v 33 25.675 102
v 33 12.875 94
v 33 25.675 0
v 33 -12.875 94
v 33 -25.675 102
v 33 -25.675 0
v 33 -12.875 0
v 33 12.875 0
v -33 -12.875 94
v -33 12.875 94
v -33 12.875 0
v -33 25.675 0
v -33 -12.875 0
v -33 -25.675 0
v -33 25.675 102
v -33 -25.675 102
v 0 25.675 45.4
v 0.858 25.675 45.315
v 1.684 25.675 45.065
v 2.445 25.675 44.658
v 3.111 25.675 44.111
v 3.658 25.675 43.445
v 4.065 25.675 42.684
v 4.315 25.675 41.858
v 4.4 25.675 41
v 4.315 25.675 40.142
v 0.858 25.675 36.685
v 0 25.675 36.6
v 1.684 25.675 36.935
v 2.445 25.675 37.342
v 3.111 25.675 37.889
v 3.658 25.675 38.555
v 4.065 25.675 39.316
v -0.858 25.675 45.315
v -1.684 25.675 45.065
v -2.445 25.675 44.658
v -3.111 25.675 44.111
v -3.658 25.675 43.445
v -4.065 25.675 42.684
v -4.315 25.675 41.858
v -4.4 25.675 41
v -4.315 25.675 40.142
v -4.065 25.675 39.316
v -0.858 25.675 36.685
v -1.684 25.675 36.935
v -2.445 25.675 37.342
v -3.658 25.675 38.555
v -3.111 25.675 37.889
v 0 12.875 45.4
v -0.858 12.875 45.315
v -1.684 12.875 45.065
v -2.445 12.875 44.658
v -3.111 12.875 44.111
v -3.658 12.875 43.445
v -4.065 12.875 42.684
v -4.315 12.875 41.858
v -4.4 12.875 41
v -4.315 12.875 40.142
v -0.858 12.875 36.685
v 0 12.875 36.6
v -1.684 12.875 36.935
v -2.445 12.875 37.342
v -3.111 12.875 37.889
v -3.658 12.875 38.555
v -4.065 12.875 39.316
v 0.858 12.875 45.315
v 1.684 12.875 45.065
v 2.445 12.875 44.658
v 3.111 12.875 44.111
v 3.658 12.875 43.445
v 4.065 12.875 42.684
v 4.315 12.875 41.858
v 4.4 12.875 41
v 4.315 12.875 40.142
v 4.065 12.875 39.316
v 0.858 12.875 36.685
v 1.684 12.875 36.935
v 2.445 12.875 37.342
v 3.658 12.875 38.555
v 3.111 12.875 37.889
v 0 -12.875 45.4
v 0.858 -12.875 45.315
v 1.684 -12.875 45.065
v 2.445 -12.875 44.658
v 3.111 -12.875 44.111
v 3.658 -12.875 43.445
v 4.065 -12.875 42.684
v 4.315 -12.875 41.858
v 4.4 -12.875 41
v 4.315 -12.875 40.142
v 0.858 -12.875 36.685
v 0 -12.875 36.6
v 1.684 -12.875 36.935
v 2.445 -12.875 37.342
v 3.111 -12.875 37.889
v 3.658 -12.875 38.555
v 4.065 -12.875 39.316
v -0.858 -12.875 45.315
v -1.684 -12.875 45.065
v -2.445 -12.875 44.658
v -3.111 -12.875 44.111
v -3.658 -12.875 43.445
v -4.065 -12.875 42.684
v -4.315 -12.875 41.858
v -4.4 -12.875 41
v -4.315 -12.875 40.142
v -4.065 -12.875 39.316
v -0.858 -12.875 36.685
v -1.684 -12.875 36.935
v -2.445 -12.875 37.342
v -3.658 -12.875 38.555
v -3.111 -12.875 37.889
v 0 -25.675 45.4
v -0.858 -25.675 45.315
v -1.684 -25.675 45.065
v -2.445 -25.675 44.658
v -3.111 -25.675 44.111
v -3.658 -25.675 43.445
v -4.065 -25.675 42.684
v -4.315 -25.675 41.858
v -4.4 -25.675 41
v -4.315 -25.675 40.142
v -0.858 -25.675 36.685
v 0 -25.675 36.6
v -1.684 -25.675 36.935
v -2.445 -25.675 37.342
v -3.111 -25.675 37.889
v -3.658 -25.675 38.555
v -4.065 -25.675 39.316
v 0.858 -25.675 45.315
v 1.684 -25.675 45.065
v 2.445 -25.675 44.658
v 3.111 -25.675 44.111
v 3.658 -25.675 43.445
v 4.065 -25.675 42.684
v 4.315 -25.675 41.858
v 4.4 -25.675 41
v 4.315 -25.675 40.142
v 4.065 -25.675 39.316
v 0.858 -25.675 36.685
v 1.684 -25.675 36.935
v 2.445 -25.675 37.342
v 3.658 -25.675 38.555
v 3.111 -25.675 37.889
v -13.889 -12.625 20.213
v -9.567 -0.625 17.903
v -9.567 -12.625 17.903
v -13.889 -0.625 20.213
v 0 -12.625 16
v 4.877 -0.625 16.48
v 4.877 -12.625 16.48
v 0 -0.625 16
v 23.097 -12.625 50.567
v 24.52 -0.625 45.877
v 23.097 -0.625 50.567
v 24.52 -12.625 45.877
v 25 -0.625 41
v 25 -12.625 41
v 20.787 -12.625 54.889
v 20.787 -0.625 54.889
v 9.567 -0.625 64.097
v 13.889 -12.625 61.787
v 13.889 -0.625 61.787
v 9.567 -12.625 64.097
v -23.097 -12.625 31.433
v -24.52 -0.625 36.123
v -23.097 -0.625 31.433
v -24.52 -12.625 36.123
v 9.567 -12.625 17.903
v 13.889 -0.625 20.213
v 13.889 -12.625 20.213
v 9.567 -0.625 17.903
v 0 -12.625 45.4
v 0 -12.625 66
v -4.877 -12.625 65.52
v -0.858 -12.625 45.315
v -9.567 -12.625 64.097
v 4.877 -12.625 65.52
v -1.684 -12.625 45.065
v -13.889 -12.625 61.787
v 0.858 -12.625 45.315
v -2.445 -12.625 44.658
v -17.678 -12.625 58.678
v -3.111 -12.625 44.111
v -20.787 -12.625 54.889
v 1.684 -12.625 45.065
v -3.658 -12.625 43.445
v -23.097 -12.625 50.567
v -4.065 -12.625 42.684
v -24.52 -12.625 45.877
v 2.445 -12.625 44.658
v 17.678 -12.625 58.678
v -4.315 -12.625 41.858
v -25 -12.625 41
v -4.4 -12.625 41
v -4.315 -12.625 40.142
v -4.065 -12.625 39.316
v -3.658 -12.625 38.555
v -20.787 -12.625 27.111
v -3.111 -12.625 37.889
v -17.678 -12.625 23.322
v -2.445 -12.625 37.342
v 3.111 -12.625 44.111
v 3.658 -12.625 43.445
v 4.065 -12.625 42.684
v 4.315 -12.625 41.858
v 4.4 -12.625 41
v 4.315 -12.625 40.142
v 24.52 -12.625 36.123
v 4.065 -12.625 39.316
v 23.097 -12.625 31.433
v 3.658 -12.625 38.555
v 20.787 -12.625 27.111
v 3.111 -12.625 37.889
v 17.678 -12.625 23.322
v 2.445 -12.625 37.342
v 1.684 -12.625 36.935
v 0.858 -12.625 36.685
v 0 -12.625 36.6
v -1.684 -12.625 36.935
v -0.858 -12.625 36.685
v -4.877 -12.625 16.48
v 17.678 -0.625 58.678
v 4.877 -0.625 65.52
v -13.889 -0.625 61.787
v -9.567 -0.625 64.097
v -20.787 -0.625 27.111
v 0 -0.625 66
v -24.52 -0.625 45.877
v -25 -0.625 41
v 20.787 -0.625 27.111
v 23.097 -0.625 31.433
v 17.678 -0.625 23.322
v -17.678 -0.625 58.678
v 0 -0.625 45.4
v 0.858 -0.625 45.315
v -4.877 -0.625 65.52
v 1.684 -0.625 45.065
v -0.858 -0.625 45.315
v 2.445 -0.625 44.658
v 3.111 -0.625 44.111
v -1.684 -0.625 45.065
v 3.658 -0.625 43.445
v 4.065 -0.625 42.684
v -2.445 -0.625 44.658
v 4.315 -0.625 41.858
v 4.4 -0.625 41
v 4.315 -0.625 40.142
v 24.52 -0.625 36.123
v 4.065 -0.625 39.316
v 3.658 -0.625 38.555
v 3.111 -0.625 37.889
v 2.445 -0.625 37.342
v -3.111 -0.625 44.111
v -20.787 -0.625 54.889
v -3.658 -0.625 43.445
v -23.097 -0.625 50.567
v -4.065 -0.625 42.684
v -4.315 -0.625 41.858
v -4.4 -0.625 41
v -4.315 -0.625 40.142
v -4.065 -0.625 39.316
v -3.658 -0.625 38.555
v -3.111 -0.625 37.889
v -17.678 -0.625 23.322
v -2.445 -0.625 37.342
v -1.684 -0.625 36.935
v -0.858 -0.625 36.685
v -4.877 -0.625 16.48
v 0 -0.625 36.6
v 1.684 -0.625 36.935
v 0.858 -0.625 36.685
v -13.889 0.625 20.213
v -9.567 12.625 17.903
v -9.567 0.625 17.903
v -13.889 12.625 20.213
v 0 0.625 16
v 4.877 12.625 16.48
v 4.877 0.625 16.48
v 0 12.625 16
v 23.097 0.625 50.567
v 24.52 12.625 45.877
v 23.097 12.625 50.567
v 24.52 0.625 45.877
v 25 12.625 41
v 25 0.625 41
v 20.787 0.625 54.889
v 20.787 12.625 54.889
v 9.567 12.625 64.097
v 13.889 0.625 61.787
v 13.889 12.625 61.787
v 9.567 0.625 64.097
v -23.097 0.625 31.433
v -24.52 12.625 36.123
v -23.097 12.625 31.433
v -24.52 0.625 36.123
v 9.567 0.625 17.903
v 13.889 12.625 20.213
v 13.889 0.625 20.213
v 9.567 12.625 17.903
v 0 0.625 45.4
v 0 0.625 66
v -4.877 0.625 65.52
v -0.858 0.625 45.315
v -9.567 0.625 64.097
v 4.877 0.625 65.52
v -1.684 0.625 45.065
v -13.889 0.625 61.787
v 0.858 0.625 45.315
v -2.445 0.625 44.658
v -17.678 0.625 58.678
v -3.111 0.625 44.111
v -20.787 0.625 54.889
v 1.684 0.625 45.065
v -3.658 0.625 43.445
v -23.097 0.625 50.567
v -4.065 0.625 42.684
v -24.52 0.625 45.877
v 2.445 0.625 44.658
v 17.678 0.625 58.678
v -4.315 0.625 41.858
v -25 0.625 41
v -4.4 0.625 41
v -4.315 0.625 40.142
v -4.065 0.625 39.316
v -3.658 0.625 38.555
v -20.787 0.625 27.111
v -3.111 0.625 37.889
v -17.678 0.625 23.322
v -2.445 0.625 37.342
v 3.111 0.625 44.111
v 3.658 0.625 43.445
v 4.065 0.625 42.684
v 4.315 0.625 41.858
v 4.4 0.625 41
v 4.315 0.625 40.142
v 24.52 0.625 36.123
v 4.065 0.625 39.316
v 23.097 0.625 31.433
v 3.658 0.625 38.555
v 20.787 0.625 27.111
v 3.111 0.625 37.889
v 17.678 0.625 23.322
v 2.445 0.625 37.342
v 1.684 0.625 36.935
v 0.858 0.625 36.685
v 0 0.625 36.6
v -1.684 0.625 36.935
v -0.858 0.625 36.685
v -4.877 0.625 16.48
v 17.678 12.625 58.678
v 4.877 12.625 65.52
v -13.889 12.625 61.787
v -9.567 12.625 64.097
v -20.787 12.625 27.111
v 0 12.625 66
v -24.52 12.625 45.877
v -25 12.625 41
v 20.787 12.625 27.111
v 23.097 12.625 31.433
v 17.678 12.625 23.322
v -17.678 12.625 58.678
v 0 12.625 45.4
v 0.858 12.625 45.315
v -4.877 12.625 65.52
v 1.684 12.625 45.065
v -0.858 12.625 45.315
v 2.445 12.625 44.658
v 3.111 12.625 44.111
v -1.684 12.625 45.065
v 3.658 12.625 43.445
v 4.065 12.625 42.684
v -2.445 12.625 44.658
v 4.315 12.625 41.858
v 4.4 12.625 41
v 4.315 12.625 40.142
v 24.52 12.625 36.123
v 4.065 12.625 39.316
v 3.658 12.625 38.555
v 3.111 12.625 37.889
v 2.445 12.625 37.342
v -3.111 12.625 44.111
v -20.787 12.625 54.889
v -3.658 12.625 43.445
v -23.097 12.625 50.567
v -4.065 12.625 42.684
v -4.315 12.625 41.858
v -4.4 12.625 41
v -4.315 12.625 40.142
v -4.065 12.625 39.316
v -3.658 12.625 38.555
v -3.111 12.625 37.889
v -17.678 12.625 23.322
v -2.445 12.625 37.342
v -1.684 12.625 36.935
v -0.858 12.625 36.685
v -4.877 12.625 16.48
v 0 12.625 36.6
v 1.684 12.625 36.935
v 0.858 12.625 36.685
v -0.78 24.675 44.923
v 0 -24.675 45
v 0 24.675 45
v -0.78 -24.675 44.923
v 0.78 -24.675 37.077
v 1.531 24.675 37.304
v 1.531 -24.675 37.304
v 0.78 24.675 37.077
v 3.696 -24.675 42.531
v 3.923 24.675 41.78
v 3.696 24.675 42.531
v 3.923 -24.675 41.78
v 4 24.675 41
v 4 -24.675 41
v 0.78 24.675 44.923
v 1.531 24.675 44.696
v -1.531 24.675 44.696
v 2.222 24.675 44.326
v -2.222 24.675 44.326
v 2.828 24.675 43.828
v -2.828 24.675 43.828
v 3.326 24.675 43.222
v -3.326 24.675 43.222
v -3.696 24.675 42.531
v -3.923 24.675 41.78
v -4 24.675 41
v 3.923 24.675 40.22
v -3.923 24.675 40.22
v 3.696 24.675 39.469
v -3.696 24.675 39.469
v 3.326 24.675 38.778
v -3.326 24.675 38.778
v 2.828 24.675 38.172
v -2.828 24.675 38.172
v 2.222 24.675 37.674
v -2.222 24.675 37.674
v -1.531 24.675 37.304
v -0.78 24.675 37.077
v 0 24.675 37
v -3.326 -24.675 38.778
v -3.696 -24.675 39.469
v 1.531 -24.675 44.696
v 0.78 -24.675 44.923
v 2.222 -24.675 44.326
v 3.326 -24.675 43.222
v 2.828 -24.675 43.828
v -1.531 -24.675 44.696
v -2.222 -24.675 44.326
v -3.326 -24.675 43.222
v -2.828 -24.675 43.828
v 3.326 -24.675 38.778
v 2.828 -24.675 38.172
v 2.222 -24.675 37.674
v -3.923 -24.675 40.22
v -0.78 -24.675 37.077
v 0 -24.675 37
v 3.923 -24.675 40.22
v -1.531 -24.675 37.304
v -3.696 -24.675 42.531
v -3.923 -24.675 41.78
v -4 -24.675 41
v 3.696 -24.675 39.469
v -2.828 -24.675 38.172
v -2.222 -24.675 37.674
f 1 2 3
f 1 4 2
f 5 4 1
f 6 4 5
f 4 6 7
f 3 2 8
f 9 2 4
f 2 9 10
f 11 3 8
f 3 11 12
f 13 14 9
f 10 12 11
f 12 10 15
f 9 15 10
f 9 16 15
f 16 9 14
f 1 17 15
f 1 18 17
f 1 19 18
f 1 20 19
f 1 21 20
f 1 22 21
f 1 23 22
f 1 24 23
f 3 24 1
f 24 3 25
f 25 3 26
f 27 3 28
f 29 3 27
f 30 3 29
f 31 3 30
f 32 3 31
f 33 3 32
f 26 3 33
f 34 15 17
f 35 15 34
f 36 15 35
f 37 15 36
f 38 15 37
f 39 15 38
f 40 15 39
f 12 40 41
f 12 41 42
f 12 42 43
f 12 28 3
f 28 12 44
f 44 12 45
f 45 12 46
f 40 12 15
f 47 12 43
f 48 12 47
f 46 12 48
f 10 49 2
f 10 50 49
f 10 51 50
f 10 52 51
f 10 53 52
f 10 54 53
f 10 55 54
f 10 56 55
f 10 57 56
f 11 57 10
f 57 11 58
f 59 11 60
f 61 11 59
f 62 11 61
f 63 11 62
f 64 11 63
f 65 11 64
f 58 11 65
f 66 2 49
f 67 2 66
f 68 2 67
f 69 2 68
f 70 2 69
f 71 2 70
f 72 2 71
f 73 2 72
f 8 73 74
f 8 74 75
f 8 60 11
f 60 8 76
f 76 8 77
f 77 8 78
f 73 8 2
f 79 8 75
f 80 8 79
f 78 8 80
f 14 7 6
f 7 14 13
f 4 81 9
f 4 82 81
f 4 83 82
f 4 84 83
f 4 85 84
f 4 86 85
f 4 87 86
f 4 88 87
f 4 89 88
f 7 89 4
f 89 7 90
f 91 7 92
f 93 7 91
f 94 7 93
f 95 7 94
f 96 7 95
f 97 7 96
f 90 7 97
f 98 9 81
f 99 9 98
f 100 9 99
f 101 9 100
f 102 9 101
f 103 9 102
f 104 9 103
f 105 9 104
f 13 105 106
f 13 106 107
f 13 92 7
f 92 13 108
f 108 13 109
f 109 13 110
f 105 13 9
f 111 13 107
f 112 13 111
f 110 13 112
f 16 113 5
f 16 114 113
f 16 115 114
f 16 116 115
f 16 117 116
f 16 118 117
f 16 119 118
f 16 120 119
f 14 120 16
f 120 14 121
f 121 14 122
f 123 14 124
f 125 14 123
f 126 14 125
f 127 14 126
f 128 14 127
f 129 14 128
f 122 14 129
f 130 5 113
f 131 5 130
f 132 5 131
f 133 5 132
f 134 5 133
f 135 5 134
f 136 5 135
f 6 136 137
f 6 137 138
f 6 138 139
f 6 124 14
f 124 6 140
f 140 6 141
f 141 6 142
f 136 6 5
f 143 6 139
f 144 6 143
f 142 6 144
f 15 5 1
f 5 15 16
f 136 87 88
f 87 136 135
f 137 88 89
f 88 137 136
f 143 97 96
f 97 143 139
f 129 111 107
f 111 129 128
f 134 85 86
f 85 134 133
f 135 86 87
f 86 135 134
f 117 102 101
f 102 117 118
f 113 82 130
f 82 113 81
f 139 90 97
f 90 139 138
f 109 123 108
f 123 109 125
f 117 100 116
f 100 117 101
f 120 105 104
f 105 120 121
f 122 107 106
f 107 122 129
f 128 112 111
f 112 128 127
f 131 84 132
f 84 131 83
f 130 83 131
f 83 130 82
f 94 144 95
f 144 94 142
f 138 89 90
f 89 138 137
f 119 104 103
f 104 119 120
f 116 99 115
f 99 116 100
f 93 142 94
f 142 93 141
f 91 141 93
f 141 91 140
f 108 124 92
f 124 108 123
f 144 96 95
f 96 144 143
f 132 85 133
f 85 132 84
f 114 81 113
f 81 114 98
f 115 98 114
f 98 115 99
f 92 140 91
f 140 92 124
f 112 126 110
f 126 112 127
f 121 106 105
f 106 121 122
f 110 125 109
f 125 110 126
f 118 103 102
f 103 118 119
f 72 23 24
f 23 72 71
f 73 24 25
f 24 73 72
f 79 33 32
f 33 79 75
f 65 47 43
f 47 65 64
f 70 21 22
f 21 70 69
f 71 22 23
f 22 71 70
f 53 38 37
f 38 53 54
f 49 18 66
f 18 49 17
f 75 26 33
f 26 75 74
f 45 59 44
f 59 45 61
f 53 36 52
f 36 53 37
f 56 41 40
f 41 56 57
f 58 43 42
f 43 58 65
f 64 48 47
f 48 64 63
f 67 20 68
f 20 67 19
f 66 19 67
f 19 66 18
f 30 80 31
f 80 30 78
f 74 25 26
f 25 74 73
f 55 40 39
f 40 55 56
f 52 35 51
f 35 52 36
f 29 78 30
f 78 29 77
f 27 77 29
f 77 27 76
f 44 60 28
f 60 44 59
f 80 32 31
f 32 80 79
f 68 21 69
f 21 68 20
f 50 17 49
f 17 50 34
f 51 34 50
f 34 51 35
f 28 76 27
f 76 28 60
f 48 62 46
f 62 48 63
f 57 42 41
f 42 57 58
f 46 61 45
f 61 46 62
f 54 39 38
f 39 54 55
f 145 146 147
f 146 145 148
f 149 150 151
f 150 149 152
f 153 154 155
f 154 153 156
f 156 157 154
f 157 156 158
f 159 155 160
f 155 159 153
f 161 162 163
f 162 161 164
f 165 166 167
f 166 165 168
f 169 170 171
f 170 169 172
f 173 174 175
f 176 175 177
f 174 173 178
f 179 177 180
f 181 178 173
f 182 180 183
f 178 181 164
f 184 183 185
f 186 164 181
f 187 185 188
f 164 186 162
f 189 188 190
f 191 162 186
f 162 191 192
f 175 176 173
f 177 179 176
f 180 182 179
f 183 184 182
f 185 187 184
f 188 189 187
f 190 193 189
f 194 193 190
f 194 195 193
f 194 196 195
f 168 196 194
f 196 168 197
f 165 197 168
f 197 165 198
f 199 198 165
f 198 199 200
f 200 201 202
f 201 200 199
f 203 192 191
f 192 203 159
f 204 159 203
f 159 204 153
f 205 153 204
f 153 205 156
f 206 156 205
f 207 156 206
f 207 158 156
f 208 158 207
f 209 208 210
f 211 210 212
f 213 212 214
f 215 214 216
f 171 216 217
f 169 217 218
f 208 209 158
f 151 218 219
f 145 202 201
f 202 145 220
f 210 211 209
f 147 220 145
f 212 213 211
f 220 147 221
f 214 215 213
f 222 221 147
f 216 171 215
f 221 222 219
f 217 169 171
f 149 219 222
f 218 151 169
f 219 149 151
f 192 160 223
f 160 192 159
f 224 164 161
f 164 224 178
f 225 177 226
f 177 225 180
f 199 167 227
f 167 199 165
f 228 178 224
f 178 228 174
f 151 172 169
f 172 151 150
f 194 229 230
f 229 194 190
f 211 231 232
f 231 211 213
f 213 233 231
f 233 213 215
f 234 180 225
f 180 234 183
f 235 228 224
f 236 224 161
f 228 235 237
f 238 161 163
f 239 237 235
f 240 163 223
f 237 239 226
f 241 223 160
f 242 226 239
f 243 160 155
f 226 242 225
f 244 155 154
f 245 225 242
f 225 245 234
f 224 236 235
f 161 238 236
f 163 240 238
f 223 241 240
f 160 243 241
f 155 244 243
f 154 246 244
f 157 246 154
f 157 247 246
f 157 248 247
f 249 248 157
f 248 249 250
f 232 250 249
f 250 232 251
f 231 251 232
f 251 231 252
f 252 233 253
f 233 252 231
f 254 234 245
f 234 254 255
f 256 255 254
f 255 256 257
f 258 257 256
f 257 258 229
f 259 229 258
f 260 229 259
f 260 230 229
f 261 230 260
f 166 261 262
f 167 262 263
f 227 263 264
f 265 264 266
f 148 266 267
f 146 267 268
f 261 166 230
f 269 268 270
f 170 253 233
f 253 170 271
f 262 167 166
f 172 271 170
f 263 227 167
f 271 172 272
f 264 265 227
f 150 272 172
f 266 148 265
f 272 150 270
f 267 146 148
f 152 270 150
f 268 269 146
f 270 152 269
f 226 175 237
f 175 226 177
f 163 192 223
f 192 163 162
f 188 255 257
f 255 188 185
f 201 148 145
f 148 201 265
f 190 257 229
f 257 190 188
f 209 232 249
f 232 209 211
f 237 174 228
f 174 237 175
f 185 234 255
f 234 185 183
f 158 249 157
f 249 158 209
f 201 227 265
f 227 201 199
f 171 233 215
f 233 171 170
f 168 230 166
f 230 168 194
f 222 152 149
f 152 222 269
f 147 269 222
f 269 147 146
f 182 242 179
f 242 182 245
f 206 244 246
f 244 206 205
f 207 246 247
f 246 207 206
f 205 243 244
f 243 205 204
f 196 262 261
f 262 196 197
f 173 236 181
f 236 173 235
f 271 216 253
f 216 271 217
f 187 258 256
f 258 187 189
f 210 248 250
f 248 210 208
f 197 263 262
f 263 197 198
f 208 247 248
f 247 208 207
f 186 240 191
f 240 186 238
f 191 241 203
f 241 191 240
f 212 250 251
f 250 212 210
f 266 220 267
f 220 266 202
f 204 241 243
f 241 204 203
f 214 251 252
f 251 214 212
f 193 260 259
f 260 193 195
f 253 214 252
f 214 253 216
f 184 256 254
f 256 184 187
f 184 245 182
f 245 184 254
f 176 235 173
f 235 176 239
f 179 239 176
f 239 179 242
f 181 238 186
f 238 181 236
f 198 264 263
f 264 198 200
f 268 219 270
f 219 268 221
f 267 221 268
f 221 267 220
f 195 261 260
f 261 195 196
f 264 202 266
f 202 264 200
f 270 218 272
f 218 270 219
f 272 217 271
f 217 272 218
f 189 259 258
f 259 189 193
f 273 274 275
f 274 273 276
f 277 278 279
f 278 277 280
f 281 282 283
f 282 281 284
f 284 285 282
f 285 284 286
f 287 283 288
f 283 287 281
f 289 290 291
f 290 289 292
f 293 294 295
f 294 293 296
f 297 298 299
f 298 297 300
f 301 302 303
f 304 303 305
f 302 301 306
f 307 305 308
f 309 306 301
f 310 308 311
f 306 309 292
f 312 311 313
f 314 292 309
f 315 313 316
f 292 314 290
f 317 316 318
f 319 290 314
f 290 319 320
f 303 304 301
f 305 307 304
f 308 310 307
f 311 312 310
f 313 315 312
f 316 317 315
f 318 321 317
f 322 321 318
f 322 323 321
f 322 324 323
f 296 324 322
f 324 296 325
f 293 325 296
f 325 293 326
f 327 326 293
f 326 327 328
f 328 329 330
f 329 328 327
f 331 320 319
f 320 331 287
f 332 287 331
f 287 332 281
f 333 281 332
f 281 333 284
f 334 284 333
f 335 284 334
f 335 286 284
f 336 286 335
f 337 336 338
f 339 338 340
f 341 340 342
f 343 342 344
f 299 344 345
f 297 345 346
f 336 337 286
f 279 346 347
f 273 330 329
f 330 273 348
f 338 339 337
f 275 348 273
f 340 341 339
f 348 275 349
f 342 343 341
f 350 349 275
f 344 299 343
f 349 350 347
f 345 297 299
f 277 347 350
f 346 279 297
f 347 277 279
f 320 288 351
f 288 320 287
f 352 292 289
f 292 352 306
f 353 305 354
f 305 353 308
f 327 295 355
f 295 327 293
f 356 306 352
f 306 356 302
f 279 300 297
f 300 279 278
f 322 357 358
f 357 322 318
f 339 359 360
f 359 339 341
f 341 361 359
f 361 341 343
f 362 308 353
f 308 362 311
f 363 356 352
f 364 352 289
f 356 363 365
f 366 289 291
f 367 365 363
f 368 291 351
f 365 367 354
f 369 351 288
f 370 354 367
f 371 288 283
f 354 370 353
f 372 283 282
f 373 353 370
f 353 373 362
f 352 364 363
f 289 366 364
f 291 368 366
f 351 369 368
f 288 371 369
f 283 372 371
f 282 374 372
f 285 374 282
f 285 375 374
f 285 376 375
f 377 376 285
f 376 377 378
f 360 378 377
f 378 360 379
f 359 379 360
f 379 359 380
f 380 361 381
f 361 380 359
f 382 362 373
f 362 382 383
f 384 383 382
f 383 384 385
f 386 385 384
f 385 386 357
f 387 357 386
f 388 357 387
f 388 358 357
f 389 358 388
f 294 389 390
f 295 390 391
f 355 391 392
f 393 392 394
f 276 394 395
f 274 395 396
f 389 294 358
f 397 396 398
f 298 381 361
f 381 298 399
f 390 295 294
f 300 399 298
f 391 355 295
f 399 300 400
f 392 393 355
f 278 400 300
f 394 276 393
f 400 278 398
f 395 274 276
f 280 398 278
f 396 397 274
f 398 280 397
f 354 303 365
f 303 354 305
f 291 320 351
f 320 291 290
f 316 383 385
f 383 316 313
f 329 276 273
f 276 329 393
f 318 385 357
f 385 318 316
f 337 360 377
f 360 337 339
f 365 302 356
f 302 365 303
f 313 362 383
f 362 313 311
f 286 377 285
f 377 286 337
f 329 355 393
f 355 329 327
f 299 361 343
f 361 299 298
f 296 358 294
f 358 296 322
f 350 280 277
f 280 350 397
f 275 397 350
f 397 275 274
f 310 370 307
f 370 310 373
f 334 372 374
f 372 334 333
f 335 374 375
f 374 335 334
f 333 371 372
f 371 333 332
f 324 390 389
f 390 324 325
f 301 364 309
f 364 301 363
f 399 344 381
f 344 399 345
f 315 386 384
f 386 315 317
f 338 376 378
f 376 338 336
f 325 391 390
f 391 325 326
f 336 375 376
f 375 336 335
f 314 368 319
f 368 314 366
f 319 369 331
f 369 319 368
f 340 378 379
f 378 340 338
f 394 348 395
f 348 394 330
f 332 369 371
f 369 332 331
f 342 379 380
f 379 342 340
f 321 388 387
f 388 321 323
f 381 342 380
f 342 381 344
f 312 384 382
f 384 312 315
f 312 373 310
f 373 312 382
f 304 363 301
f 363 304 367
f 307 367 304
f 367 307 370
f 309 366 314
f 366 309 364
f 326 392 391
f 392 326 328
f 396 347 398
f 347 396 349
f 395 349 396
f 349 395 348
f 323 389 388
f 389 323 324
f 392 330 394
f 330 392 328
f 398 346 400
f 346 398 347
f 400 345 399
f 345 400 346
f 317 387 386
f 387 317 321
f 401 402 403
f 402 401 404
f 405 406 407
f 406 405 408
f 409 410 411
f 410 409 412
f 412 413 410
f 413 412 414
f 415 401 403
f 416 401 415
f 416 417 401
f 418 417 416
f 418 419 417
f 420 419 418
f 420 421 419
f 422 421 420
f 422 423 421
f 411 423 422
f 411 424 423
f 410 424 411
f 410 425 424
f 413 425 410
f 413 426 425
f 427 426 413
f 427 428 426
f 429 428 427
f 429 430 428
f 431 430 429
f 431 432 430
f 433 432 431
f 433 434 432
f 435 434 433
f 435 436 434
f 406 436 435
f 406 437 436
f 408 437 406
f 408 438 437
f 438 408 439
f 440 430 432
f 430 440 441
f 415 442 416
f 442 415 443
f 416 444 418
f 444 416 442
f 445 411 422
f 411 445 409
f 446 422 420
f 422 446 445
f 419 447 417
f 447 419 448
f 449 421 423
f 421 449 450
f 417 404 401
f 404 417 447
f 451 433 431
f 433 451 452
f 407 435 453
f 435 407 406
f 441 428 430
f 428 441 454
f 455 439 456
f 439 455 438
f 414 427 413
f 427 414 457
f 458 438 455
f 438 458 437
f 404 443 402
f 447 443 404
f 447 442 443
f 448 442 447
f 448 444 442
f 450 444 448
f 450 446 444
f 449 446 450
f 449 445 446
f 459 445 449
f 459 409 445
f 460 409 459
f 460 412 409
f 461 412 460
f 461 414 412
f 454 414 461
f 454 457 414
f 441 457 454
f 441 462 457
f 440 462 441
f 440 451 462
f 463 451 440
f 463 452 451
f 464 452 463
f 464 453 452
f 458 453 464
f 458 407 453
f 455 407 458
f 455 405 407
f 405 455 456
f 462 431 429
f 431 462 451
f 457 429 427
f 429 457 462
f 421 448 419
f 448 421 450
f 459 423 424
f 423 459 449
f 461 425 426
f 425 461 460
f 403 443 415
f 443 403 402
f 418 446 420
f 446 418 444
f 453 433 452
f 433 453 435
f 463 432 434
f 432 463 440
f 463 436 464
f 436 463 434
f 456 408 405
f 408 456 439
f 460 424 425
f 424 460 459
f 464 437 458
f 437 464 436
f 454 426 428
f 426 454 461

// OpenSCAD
$fn = 32;

// ------------------------------------------------------------------------
// Trolley wheel set: wheels d50, fork 94 mm tall
// Every part is its own module, assembly() places every instance.
// ------------------------------------------------------------------------

// --- part 1 ---
module trolley_fork() {
  difference() {
    union() {
      translate([-33, 12.875, 0]) cube([66, 12.8, 94]);
      translate([-33, -25.675, 0]) cube([66, 12.8, 94]);
      translate([-33, -25.675, 94]) cube([66, 51.35, 8]);
    }
    translate([0, -19.275, 41]) rotate([90, 0, 0]) cylinder(h = 14.8, d = 8.8, center = true);
    translate([0, 19.275, 41]) rotate([90, 0, 0]) cylinder(h = 14.8, d = 8.8, center = true);
  }
}

// --- part 2 ---
module trolley_wheel() {
  difference() {
      translate([0, 0, 0]) cylinder(h = 12, d = 50);
      translate([0, 0, -1]) cylinder(h = 14, d = 8.8);
    }
}

// --- part 3 ---
module trolley_axle() {
  translate([0, 0, -24.675]) cylinder(h = 49.35, d = 8);
}

// --- assembly ---
module assembly() {
  color([0.80, 0.24, 0.20]) translate([0, 0, 0]) rotate([0, 0, 0]) trolley_fork();
  color([0.20, 0.45, 0.75]) translate([0, -0.625, 41]) rotate([90, 0, 0]) trolley_wheel();
  color([0.25, 0.62, 0.32]) translate([0, 12.625, 41]) rotate([90, 0, 0]) trolley_wheel();
  color([0.92, 0.70, 0.18]) translate([0, 0, 41]) rotate([90, 0, 0]) trolley_axle();
}

assembly();
